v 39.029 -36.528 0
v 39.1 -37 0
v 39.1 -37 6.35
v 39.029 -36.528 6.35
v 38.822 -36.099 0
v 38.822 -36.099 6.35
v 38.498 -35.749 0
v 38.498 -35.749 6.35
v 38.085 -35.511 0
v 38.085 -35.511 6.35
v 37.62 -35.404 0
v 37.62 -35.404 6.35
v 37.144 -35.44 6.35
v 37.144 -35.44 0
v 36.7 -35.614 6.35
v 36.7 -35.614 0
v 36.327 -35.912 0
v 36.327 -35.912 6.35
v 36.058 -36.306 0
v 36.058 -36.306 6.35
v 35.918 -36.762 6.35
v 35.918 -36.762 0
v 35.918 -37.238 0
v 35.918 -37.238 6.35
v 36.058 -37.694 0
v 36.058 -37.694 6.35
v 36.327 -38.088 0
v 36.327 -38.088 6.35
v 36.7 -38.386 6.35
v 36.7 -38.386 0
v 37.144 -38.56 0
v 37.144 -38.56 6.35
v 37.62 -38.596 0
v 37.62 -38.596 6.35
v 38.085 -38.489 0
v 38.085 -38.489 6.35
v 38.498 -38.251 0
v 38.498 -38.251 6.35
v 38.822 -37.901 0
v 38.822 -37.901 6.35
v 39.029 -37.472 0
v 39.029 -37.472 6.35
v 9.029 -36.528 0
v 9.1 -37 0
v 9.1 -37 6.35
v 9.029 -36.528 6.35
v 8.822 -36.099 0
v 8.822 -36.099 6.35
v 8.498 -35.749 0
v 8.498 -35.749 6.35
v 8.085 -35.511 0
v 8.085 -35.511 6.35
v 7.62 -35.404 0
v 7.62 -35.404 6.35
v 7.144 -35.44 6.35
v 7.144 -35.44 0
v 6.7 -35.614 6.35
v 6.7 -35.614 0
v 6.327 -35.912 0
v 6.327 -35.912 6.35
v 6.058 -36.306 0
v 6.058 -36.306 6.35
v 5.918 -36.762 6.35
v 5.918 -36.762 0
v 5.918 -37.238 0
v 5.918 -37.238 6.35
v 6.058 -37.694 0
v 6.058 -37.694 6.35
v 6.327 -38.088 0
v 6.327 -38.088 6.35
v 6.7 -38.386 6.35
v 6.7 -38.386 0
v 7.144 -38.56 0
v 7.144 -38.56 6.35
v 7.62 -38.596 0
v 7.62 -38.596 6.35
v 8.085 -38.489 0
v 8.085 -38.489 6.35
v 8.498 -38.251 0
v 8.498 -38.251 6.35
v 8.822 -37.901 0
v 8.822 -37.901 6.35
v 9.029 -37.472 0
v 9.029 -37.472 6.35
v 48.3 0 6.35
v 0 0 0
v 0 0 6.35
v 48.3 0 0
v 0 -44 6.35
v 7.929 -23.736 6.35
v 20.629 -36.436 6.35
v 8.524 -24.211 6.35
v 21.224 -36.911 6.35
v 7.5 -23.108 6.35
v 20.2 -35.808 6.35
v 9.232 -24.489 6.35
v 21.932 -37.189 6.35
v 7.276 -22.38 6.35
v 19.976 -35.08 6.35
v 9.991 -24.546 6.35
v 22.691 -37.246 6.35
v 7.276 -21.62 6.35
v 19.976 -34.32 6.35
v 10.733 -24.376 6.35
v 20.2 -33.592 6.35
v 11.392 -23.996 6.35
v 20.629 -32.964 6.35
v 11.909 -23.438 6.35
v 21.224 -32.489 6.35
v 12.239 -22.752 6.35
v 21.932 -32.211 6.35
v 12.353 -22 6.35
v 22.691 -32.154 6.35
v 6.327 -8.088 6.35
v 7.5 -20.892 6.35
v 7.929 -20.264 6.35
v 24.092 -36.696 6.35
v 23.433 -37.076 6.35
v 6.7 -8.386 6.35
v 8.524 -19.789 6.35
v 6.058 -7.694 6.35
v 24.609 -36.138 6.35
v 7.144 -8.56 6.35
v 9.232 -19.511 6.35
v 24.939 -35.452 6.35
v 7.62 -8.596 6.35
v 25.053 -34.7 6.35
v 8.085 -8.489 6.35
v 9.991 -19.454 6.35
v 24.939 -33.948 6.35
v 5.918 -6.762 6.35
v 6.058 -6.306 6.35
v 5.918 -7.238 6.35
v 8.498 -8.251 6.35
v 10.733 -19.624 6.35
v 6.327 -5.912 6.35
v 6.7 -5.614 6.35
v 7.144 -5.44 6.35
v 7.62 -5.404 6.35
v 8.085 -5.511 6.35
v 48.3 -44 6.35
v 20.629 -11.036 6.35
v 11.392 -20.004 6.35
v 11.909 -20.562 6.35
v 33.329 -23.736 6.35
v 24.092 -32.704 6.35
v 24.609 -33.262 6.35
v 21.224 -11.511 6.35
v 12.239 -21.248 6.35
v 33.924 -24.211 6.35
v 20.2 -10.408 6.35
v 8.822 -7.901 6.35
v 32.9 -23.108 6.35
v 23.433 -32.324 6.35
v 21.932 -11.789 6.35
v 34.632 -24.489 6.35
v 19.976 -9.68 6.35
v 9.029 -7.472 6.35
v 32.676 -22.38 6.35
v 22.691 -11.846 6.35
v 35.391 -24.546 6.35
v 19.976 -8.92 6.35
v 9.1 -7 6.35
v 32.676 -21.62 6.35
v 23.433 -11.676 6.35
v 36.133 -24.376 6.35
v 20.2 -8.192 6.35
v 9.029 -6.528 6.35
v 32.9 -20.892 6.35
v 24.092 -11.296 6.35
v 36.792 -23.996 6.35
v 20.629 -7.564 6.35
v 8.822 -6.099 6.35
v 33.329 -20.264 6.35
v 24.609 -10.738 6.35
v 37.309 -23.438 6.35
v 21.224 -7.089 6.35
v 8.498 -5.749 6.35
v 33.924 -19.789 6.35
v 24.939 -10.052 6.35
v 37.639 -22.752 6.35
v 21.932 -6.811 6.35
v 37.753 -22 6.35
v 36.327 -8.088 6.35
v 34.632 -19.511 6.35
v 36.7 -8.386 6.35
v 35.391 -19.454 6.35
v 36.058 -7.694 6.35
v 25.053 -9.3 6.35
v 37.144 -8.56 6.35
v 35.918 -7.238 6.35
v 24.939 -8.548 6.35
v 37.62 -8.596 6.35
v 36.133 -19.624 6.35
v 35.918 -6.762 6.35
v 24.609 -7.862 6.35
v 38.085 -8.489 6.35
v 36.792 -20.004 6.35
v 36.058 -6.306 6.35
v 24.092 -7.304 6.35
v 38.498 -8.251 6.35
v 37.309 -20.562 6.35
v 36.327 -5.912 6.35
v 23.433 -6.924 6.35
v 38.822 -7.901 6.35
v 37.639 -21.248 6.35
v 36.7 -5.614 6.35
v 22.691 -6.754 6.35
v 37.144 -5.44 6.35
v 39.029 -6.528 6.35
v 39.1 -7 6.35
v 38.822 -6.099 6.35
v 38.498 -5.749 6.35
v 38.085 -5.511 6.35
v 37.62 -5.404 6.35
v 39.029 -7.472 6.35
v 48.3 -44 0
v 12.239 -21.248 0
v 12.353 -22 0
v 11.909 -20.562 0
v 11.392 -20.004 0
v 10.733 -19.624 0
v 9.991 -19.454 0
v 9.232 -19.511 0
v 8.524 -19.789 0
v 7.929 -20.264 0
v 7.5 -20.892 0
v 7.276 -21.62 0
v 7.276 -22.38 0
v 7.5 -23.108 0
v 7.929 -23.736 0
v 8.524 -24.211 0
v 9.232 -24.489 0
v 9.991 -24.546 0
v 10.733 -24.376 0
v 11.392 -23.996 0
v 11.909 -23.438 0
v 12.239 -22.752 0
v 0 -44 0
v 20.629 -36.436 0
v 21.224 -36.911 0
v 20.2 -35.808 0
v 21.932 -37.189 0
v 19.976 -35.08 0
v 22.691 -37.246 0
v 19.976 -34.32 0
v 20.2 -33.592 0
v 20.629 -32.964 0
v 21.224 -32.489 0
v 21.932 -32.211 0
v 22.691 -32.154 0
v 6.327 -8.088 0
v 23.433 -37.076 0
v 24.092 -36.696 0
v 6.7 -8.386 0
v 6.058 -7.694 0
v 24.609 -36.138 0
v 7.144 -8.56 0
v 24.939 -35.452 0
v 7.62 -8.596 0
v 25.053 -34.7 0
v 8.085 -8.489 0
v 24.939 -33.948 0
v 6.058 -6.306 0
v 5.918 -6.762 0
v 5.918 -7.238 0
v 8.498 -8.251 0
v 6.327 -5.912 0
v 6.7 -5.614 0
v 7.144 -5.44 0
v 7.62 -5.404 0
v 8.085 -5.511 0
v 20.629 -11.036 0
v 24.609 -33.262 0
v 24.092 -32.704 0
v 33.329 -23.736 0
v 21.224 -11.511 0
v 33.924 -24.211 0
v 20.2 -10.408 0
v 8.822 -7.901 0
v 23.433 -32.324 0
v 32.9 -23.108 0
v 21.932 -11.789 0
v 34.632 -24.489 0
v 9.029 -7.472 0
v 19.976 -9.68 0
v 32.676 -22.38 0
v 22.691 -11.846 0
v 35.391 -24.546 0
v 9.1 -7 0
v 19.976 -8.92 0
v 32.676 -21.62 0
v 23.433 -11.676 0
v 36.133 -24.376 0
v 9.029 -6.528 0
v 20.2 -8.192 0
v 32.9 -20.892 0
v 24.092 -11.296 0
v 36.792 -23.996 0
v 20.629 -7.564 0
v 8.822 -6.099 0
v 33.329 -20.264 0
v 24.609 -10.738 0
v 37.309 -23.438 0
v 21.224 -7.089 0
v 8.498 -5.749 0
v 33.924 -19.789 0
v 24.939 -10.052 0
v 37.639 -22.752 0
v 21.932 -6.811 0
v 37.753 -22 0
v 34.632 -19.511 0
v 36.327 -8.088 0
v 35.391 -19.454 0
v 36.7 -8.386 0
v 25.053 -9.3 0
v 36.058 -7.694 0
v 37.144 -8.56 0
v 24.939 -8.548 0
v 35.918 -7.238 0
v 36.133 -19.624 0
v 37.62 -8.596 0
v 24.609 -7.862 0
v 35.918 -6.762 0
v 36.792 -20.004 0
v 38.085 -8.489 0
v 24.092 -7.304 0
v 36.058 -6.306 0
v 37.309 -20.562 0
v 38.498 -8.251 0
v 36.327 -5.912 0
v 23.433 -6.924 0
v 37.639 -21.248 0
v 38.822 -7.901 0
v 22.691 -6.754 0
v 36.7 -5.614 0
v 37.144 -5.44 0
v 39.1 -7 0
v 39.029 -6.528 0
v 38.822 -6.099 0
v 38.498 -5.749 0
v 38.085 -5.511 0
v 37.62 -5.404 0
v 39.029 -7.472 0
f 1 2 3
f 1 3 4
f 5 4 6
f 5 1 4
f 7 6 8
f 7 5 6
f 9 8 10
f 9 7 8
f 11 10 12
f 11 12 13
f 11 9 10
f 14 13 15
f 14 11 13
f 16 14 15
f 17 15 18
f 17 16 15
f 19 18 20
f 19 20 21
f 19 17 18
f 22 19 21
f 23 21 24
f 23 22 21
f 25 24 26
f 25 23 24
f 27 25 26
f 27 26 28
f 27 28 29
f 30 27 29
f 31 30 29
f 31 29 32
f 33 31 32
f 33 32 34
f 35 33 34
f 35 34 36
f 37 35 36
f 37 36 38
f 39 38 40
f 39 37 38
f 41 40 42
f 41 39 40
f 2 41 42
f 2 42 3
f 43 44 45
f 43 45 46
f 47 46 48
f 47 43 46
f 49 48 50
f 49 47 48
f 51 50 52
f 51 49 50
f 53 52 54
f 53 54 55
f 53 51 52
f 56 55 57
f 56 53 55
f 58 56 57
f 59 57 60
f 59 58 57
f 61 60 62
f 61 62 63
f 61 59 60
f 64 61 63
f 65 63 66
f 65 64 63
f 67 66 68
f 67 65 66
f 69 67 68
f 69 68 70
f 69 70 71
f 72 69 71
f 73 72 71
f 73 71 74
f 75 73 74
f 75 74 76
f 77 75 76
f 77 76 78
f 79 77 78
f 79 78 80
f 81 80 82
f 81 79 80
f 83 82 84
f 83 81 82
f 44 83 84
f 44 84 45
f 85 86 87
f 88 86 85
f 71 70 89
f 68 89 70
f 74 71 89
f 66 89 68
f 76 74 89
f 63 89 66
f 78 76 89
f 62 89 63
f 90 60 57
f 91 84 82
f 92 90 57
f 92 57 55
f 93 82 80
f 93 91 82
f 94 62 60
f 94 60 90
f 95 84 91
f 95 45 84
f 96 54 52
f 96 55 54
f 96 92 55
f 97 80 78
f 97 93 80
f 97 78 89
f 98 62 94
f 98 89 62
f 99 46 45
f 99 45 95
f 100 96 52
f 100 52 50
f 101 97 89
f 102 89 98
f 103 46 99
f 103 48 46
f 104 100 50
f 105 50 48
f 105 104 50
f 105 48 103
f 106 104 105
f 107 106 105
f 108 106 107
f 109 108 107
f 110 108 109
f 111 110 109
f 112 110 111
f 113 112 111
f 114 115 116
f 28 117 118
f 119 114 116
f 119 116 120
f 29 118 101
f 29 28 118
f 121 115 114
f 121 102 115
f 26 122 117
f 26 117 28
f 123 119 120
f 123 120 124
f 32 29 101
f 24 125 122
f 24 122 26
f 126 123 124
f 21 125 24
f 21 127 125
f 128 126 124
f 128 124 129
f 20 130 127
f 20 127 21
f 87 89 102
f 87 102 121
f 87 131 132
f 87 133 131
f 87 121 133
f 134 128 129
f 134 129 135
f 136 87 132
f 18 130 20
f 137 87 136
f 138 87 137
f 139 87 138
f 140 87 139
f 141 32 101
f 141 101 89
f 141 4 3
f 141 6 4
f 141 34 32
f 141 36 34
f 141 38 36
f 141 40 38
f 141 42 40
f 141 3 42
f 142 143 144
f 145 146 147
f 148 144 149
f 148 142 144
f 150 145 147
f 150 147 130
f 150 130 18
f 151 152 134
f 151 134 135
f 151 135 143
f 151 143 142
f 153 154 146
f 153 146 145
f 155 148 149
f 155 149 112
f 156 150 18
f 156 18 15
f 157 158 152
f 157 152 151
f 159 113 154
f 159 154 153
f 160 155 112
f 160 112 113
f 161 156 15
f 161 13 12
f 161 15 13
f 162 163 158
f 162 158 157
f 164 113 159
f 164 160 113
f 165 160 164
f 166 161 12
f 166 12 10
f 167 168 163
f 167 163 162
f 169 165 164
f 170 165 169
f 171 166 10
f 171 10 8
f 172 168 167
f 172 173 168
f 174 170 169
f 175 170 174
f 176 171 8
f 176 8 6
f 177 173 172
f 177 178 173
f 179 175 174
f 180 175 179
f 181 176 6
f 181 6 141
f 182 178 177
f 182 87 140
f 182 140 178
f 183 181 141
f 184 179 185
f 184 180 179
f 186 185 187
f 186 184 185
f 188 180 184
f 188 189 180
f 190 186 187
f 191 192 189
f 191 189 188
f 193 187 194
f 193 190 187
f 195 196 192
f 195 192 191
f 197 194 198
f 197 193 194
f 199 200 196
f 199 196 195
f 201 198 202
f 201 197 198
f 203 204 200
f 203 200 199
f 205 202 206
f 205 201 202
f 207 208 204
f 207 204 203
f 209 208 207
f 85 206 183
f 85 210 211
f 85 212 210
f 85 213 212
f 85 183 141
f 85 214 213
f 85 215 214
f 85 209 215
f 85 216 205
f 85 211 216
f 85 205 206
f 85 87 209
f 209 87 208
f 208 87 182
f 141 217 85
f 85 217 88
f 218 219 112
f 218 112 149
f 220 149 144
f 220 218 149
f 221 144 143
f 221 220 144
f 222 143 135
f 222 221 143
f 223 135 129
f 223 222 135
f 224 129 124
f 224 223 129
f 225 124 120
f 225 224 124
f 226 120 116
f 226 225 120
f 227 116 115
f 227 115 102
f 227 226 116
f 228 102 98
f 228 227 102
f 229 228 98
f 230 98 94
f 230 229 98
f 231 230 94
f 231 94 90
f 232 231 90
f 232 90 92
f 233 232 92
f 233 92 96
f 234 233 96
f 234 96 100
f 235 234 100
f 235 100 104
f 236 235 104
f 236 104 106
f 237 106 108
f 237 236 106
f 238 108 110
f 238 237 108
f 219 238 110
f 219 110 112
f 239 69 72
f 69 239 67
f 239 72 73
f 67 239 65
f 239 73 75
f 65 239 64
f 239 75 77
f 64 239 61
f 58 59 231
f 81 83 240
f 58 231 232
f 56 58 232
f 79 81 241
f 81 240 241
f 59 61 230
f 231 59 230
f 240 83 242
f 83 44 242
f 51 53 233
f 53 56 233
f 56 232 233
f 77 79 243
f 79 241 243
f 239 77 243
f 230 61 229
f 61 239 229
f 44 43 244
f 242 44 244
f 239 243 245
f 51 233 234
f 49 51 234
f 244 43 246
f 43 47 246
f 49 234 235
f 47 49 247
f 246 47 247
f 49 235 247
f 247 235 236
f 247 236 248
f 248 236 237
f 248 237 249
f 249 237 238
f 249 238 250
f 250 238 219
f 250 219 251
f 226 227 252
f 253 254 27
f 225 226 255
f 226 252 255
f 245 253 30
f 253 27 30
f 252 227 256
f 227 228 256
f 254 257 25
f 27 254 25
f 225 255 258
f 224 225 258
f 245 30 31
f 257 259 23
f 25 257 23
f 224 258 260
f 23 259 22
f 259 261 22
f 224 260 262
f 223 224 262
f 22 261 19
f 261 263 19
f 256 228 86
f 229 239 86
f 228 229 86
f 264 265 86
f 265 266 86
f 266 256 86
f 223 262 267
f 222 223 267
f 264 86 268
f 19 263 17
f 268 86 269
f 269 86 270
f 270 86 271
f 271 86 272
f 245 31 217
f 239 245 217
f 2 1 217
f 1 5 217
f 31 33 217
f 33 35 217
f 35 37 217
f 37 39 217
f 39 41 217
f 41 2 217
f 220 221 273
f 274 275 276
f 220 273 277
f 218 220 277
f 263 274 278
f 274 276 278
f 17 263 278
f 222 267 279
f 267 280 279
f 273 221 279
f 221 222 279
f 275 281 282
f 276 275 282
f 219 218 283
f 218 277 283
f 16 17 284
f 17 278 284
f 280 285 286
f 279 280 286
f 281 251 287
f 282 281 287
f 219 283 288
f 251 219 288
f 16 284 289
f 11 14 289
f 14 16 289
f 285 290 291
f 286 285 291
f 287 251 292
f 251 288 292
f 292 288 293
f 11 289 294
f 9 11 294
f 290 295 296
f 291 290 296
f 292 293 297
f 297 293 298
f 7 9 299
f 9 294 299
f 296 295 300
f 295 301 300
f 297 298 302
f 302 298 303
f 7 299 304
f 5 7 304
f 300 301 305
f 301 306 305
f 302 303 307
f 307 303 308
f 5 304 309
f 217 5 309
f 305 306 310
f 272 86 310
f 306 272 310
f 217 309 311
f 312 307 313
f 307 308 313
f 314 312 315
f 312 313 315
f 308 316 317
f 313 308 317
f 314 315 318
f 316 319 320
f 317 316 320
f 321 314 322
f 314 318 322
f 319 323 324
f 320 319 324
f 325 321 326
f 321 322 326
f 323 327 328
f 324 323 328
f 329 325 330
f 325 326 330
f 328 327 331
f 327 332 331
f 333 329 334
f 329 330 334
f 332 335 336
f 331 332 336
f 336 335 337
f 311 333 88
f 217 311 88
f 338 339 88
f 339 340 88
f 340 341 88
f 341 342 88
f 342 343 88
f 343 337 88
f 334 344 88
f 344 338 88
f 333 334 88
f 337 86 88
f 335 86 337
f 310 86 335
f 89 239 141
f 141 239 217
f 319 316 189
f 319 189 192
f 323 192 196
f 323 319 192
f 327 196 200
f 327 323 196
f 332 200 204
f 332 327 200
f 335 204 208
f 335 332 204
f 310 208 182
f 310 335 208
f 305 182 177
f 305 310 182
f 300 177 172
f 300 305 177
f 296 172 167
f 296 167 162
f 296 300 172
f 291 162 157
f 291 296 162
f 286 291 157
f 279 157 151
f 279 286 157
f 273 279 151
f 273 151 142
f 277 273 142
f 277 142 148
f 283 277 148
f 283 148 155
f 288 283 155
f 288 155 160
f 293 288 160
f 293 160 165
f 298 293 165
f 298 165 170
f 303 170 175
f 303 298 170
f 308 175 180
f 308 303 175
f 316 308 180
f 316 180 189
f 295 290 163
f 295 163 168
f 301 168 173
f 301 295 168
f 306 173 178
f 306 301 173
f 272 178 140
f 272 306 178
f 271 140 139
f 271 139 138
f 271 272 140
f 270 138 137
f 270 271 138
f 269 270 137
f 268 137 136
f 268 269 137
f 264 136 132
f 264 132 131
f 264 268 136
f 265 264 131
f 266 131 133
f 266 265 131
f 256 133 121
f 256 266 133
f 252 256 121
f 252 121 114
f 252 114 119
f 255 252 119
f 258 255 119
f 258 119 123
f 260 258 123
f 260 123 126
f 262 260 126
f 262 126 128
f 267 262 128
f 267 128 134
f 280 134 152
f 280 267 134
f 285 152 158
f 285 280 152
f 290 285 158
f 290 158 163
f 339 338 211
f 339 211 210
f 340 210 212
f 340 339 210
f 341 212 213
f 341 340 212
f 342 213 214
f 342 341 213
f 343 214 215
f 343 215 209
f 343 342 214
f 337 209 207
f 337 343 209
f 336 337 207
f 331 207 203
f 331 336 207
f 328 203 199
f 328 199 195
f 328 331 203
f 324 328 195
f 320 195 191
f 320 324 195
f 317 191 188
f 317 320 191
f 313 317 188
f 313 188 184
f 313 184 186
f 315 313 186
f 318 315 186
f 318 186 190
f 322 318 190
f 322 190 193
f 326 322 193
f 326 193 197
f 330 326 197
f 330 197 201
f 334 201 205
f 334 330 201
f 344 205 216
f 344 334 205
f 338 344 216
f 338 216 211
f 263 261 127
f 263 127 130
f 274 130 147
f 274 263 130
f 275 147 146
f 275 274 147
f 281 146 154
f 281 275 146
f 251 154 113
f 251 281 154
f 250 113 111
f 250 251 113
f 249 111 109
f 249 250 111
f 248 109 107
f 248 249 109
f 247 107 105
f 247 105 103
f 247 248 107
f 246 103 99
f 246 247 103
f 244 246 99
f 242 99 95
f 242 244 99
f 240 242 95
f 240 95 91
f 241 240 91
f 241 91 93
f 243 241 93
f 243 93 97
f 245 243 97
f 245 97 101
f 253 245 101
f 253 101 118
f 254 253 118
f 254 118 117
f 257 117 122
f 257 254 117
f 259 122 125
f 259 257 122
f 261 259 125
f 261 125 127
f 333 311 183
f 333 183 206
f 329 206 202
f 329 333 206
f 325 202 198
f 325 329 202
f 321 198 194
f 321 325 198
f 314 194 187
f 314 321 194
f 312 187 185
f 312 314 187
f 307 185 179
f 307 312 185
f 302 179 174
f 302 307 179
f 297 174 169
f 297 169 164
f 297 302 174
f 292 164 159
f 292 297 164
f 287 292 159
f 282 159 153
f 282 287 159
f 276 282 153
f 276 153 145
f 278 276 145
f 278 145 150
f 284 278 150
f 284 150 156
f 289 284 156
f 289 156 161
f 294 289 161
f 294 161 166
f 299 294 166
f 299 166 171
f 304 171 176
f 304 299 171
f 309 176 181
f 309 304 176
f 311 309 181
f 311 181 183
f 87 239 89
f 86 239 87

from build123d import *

# Parameters (mm, degrees)
SKETCH1_W               = 48.3
SKETCH1_H               = 44
SKETCH1_R               = 1.6
SKETCH1_R_2             = 2.5527
BOSS_EXTRUDE1_DEPTH     = 6.35
F_1_4_20_TAPPED_HOLE1_D = 5.1054


with BuildPart() as part:
    # Sketch1 → Boss-Extrude1 (new body)
    with BuildSketch(Plane.XY):
        with Locations((24.15, -22)):
            Rectangle(SKETCH1_W, SKETCH1_H)
        with Locations((7.5, -37)):
            Circle(SKETCH1_R, mode=Mode.SUBTRACT)
        with Locations((22.5, -9.3)):
            Circle(SKETCH1_R_2, mode=Mode.SUBTRACT)
        with Locations((35.2, -22)):
            Circle(SKETCH1_R_2, mode=Mode.SUBTRACT)
        with Locations((9.8, -22)):
            Circle(SKETCH1_R_2, mode=Mode.SUBTRACT)
        with Locations((22.5, -34.7)):
            Circle(SKETCH1_R_2, mode=Mode.SUBTRACT)
        with Locations((37.5, -37)):
            Circle(SKETCH1_R, mode=Mode.SUBTRACT)
        with Locations((37.5, -7)):
            Circle(SKETCH1_R, mode=Mode.SUBTRACT)
        with Locations((7.5, -7)):
            Circle(SKETCH1_R, mode=Mode.SUBTRACT)
    extrude(amount=BOSS_EXTRUDE1_DEPTH)

    # 1/4-20 Tapped Hole1 (through all)
    with Locations(Plane(origin=(22.5, -9.3, 6.35), x_dir=(1, 0, 0), z_dir=(0, 0, 1))):
        with Locations((0, 0), (12.7, -12.7), (-12.7, -12.7), (0, -25.4)):
            Hole(F_1_4_20_TAPPED_HOLE1_D / 2)


solid = part.part
